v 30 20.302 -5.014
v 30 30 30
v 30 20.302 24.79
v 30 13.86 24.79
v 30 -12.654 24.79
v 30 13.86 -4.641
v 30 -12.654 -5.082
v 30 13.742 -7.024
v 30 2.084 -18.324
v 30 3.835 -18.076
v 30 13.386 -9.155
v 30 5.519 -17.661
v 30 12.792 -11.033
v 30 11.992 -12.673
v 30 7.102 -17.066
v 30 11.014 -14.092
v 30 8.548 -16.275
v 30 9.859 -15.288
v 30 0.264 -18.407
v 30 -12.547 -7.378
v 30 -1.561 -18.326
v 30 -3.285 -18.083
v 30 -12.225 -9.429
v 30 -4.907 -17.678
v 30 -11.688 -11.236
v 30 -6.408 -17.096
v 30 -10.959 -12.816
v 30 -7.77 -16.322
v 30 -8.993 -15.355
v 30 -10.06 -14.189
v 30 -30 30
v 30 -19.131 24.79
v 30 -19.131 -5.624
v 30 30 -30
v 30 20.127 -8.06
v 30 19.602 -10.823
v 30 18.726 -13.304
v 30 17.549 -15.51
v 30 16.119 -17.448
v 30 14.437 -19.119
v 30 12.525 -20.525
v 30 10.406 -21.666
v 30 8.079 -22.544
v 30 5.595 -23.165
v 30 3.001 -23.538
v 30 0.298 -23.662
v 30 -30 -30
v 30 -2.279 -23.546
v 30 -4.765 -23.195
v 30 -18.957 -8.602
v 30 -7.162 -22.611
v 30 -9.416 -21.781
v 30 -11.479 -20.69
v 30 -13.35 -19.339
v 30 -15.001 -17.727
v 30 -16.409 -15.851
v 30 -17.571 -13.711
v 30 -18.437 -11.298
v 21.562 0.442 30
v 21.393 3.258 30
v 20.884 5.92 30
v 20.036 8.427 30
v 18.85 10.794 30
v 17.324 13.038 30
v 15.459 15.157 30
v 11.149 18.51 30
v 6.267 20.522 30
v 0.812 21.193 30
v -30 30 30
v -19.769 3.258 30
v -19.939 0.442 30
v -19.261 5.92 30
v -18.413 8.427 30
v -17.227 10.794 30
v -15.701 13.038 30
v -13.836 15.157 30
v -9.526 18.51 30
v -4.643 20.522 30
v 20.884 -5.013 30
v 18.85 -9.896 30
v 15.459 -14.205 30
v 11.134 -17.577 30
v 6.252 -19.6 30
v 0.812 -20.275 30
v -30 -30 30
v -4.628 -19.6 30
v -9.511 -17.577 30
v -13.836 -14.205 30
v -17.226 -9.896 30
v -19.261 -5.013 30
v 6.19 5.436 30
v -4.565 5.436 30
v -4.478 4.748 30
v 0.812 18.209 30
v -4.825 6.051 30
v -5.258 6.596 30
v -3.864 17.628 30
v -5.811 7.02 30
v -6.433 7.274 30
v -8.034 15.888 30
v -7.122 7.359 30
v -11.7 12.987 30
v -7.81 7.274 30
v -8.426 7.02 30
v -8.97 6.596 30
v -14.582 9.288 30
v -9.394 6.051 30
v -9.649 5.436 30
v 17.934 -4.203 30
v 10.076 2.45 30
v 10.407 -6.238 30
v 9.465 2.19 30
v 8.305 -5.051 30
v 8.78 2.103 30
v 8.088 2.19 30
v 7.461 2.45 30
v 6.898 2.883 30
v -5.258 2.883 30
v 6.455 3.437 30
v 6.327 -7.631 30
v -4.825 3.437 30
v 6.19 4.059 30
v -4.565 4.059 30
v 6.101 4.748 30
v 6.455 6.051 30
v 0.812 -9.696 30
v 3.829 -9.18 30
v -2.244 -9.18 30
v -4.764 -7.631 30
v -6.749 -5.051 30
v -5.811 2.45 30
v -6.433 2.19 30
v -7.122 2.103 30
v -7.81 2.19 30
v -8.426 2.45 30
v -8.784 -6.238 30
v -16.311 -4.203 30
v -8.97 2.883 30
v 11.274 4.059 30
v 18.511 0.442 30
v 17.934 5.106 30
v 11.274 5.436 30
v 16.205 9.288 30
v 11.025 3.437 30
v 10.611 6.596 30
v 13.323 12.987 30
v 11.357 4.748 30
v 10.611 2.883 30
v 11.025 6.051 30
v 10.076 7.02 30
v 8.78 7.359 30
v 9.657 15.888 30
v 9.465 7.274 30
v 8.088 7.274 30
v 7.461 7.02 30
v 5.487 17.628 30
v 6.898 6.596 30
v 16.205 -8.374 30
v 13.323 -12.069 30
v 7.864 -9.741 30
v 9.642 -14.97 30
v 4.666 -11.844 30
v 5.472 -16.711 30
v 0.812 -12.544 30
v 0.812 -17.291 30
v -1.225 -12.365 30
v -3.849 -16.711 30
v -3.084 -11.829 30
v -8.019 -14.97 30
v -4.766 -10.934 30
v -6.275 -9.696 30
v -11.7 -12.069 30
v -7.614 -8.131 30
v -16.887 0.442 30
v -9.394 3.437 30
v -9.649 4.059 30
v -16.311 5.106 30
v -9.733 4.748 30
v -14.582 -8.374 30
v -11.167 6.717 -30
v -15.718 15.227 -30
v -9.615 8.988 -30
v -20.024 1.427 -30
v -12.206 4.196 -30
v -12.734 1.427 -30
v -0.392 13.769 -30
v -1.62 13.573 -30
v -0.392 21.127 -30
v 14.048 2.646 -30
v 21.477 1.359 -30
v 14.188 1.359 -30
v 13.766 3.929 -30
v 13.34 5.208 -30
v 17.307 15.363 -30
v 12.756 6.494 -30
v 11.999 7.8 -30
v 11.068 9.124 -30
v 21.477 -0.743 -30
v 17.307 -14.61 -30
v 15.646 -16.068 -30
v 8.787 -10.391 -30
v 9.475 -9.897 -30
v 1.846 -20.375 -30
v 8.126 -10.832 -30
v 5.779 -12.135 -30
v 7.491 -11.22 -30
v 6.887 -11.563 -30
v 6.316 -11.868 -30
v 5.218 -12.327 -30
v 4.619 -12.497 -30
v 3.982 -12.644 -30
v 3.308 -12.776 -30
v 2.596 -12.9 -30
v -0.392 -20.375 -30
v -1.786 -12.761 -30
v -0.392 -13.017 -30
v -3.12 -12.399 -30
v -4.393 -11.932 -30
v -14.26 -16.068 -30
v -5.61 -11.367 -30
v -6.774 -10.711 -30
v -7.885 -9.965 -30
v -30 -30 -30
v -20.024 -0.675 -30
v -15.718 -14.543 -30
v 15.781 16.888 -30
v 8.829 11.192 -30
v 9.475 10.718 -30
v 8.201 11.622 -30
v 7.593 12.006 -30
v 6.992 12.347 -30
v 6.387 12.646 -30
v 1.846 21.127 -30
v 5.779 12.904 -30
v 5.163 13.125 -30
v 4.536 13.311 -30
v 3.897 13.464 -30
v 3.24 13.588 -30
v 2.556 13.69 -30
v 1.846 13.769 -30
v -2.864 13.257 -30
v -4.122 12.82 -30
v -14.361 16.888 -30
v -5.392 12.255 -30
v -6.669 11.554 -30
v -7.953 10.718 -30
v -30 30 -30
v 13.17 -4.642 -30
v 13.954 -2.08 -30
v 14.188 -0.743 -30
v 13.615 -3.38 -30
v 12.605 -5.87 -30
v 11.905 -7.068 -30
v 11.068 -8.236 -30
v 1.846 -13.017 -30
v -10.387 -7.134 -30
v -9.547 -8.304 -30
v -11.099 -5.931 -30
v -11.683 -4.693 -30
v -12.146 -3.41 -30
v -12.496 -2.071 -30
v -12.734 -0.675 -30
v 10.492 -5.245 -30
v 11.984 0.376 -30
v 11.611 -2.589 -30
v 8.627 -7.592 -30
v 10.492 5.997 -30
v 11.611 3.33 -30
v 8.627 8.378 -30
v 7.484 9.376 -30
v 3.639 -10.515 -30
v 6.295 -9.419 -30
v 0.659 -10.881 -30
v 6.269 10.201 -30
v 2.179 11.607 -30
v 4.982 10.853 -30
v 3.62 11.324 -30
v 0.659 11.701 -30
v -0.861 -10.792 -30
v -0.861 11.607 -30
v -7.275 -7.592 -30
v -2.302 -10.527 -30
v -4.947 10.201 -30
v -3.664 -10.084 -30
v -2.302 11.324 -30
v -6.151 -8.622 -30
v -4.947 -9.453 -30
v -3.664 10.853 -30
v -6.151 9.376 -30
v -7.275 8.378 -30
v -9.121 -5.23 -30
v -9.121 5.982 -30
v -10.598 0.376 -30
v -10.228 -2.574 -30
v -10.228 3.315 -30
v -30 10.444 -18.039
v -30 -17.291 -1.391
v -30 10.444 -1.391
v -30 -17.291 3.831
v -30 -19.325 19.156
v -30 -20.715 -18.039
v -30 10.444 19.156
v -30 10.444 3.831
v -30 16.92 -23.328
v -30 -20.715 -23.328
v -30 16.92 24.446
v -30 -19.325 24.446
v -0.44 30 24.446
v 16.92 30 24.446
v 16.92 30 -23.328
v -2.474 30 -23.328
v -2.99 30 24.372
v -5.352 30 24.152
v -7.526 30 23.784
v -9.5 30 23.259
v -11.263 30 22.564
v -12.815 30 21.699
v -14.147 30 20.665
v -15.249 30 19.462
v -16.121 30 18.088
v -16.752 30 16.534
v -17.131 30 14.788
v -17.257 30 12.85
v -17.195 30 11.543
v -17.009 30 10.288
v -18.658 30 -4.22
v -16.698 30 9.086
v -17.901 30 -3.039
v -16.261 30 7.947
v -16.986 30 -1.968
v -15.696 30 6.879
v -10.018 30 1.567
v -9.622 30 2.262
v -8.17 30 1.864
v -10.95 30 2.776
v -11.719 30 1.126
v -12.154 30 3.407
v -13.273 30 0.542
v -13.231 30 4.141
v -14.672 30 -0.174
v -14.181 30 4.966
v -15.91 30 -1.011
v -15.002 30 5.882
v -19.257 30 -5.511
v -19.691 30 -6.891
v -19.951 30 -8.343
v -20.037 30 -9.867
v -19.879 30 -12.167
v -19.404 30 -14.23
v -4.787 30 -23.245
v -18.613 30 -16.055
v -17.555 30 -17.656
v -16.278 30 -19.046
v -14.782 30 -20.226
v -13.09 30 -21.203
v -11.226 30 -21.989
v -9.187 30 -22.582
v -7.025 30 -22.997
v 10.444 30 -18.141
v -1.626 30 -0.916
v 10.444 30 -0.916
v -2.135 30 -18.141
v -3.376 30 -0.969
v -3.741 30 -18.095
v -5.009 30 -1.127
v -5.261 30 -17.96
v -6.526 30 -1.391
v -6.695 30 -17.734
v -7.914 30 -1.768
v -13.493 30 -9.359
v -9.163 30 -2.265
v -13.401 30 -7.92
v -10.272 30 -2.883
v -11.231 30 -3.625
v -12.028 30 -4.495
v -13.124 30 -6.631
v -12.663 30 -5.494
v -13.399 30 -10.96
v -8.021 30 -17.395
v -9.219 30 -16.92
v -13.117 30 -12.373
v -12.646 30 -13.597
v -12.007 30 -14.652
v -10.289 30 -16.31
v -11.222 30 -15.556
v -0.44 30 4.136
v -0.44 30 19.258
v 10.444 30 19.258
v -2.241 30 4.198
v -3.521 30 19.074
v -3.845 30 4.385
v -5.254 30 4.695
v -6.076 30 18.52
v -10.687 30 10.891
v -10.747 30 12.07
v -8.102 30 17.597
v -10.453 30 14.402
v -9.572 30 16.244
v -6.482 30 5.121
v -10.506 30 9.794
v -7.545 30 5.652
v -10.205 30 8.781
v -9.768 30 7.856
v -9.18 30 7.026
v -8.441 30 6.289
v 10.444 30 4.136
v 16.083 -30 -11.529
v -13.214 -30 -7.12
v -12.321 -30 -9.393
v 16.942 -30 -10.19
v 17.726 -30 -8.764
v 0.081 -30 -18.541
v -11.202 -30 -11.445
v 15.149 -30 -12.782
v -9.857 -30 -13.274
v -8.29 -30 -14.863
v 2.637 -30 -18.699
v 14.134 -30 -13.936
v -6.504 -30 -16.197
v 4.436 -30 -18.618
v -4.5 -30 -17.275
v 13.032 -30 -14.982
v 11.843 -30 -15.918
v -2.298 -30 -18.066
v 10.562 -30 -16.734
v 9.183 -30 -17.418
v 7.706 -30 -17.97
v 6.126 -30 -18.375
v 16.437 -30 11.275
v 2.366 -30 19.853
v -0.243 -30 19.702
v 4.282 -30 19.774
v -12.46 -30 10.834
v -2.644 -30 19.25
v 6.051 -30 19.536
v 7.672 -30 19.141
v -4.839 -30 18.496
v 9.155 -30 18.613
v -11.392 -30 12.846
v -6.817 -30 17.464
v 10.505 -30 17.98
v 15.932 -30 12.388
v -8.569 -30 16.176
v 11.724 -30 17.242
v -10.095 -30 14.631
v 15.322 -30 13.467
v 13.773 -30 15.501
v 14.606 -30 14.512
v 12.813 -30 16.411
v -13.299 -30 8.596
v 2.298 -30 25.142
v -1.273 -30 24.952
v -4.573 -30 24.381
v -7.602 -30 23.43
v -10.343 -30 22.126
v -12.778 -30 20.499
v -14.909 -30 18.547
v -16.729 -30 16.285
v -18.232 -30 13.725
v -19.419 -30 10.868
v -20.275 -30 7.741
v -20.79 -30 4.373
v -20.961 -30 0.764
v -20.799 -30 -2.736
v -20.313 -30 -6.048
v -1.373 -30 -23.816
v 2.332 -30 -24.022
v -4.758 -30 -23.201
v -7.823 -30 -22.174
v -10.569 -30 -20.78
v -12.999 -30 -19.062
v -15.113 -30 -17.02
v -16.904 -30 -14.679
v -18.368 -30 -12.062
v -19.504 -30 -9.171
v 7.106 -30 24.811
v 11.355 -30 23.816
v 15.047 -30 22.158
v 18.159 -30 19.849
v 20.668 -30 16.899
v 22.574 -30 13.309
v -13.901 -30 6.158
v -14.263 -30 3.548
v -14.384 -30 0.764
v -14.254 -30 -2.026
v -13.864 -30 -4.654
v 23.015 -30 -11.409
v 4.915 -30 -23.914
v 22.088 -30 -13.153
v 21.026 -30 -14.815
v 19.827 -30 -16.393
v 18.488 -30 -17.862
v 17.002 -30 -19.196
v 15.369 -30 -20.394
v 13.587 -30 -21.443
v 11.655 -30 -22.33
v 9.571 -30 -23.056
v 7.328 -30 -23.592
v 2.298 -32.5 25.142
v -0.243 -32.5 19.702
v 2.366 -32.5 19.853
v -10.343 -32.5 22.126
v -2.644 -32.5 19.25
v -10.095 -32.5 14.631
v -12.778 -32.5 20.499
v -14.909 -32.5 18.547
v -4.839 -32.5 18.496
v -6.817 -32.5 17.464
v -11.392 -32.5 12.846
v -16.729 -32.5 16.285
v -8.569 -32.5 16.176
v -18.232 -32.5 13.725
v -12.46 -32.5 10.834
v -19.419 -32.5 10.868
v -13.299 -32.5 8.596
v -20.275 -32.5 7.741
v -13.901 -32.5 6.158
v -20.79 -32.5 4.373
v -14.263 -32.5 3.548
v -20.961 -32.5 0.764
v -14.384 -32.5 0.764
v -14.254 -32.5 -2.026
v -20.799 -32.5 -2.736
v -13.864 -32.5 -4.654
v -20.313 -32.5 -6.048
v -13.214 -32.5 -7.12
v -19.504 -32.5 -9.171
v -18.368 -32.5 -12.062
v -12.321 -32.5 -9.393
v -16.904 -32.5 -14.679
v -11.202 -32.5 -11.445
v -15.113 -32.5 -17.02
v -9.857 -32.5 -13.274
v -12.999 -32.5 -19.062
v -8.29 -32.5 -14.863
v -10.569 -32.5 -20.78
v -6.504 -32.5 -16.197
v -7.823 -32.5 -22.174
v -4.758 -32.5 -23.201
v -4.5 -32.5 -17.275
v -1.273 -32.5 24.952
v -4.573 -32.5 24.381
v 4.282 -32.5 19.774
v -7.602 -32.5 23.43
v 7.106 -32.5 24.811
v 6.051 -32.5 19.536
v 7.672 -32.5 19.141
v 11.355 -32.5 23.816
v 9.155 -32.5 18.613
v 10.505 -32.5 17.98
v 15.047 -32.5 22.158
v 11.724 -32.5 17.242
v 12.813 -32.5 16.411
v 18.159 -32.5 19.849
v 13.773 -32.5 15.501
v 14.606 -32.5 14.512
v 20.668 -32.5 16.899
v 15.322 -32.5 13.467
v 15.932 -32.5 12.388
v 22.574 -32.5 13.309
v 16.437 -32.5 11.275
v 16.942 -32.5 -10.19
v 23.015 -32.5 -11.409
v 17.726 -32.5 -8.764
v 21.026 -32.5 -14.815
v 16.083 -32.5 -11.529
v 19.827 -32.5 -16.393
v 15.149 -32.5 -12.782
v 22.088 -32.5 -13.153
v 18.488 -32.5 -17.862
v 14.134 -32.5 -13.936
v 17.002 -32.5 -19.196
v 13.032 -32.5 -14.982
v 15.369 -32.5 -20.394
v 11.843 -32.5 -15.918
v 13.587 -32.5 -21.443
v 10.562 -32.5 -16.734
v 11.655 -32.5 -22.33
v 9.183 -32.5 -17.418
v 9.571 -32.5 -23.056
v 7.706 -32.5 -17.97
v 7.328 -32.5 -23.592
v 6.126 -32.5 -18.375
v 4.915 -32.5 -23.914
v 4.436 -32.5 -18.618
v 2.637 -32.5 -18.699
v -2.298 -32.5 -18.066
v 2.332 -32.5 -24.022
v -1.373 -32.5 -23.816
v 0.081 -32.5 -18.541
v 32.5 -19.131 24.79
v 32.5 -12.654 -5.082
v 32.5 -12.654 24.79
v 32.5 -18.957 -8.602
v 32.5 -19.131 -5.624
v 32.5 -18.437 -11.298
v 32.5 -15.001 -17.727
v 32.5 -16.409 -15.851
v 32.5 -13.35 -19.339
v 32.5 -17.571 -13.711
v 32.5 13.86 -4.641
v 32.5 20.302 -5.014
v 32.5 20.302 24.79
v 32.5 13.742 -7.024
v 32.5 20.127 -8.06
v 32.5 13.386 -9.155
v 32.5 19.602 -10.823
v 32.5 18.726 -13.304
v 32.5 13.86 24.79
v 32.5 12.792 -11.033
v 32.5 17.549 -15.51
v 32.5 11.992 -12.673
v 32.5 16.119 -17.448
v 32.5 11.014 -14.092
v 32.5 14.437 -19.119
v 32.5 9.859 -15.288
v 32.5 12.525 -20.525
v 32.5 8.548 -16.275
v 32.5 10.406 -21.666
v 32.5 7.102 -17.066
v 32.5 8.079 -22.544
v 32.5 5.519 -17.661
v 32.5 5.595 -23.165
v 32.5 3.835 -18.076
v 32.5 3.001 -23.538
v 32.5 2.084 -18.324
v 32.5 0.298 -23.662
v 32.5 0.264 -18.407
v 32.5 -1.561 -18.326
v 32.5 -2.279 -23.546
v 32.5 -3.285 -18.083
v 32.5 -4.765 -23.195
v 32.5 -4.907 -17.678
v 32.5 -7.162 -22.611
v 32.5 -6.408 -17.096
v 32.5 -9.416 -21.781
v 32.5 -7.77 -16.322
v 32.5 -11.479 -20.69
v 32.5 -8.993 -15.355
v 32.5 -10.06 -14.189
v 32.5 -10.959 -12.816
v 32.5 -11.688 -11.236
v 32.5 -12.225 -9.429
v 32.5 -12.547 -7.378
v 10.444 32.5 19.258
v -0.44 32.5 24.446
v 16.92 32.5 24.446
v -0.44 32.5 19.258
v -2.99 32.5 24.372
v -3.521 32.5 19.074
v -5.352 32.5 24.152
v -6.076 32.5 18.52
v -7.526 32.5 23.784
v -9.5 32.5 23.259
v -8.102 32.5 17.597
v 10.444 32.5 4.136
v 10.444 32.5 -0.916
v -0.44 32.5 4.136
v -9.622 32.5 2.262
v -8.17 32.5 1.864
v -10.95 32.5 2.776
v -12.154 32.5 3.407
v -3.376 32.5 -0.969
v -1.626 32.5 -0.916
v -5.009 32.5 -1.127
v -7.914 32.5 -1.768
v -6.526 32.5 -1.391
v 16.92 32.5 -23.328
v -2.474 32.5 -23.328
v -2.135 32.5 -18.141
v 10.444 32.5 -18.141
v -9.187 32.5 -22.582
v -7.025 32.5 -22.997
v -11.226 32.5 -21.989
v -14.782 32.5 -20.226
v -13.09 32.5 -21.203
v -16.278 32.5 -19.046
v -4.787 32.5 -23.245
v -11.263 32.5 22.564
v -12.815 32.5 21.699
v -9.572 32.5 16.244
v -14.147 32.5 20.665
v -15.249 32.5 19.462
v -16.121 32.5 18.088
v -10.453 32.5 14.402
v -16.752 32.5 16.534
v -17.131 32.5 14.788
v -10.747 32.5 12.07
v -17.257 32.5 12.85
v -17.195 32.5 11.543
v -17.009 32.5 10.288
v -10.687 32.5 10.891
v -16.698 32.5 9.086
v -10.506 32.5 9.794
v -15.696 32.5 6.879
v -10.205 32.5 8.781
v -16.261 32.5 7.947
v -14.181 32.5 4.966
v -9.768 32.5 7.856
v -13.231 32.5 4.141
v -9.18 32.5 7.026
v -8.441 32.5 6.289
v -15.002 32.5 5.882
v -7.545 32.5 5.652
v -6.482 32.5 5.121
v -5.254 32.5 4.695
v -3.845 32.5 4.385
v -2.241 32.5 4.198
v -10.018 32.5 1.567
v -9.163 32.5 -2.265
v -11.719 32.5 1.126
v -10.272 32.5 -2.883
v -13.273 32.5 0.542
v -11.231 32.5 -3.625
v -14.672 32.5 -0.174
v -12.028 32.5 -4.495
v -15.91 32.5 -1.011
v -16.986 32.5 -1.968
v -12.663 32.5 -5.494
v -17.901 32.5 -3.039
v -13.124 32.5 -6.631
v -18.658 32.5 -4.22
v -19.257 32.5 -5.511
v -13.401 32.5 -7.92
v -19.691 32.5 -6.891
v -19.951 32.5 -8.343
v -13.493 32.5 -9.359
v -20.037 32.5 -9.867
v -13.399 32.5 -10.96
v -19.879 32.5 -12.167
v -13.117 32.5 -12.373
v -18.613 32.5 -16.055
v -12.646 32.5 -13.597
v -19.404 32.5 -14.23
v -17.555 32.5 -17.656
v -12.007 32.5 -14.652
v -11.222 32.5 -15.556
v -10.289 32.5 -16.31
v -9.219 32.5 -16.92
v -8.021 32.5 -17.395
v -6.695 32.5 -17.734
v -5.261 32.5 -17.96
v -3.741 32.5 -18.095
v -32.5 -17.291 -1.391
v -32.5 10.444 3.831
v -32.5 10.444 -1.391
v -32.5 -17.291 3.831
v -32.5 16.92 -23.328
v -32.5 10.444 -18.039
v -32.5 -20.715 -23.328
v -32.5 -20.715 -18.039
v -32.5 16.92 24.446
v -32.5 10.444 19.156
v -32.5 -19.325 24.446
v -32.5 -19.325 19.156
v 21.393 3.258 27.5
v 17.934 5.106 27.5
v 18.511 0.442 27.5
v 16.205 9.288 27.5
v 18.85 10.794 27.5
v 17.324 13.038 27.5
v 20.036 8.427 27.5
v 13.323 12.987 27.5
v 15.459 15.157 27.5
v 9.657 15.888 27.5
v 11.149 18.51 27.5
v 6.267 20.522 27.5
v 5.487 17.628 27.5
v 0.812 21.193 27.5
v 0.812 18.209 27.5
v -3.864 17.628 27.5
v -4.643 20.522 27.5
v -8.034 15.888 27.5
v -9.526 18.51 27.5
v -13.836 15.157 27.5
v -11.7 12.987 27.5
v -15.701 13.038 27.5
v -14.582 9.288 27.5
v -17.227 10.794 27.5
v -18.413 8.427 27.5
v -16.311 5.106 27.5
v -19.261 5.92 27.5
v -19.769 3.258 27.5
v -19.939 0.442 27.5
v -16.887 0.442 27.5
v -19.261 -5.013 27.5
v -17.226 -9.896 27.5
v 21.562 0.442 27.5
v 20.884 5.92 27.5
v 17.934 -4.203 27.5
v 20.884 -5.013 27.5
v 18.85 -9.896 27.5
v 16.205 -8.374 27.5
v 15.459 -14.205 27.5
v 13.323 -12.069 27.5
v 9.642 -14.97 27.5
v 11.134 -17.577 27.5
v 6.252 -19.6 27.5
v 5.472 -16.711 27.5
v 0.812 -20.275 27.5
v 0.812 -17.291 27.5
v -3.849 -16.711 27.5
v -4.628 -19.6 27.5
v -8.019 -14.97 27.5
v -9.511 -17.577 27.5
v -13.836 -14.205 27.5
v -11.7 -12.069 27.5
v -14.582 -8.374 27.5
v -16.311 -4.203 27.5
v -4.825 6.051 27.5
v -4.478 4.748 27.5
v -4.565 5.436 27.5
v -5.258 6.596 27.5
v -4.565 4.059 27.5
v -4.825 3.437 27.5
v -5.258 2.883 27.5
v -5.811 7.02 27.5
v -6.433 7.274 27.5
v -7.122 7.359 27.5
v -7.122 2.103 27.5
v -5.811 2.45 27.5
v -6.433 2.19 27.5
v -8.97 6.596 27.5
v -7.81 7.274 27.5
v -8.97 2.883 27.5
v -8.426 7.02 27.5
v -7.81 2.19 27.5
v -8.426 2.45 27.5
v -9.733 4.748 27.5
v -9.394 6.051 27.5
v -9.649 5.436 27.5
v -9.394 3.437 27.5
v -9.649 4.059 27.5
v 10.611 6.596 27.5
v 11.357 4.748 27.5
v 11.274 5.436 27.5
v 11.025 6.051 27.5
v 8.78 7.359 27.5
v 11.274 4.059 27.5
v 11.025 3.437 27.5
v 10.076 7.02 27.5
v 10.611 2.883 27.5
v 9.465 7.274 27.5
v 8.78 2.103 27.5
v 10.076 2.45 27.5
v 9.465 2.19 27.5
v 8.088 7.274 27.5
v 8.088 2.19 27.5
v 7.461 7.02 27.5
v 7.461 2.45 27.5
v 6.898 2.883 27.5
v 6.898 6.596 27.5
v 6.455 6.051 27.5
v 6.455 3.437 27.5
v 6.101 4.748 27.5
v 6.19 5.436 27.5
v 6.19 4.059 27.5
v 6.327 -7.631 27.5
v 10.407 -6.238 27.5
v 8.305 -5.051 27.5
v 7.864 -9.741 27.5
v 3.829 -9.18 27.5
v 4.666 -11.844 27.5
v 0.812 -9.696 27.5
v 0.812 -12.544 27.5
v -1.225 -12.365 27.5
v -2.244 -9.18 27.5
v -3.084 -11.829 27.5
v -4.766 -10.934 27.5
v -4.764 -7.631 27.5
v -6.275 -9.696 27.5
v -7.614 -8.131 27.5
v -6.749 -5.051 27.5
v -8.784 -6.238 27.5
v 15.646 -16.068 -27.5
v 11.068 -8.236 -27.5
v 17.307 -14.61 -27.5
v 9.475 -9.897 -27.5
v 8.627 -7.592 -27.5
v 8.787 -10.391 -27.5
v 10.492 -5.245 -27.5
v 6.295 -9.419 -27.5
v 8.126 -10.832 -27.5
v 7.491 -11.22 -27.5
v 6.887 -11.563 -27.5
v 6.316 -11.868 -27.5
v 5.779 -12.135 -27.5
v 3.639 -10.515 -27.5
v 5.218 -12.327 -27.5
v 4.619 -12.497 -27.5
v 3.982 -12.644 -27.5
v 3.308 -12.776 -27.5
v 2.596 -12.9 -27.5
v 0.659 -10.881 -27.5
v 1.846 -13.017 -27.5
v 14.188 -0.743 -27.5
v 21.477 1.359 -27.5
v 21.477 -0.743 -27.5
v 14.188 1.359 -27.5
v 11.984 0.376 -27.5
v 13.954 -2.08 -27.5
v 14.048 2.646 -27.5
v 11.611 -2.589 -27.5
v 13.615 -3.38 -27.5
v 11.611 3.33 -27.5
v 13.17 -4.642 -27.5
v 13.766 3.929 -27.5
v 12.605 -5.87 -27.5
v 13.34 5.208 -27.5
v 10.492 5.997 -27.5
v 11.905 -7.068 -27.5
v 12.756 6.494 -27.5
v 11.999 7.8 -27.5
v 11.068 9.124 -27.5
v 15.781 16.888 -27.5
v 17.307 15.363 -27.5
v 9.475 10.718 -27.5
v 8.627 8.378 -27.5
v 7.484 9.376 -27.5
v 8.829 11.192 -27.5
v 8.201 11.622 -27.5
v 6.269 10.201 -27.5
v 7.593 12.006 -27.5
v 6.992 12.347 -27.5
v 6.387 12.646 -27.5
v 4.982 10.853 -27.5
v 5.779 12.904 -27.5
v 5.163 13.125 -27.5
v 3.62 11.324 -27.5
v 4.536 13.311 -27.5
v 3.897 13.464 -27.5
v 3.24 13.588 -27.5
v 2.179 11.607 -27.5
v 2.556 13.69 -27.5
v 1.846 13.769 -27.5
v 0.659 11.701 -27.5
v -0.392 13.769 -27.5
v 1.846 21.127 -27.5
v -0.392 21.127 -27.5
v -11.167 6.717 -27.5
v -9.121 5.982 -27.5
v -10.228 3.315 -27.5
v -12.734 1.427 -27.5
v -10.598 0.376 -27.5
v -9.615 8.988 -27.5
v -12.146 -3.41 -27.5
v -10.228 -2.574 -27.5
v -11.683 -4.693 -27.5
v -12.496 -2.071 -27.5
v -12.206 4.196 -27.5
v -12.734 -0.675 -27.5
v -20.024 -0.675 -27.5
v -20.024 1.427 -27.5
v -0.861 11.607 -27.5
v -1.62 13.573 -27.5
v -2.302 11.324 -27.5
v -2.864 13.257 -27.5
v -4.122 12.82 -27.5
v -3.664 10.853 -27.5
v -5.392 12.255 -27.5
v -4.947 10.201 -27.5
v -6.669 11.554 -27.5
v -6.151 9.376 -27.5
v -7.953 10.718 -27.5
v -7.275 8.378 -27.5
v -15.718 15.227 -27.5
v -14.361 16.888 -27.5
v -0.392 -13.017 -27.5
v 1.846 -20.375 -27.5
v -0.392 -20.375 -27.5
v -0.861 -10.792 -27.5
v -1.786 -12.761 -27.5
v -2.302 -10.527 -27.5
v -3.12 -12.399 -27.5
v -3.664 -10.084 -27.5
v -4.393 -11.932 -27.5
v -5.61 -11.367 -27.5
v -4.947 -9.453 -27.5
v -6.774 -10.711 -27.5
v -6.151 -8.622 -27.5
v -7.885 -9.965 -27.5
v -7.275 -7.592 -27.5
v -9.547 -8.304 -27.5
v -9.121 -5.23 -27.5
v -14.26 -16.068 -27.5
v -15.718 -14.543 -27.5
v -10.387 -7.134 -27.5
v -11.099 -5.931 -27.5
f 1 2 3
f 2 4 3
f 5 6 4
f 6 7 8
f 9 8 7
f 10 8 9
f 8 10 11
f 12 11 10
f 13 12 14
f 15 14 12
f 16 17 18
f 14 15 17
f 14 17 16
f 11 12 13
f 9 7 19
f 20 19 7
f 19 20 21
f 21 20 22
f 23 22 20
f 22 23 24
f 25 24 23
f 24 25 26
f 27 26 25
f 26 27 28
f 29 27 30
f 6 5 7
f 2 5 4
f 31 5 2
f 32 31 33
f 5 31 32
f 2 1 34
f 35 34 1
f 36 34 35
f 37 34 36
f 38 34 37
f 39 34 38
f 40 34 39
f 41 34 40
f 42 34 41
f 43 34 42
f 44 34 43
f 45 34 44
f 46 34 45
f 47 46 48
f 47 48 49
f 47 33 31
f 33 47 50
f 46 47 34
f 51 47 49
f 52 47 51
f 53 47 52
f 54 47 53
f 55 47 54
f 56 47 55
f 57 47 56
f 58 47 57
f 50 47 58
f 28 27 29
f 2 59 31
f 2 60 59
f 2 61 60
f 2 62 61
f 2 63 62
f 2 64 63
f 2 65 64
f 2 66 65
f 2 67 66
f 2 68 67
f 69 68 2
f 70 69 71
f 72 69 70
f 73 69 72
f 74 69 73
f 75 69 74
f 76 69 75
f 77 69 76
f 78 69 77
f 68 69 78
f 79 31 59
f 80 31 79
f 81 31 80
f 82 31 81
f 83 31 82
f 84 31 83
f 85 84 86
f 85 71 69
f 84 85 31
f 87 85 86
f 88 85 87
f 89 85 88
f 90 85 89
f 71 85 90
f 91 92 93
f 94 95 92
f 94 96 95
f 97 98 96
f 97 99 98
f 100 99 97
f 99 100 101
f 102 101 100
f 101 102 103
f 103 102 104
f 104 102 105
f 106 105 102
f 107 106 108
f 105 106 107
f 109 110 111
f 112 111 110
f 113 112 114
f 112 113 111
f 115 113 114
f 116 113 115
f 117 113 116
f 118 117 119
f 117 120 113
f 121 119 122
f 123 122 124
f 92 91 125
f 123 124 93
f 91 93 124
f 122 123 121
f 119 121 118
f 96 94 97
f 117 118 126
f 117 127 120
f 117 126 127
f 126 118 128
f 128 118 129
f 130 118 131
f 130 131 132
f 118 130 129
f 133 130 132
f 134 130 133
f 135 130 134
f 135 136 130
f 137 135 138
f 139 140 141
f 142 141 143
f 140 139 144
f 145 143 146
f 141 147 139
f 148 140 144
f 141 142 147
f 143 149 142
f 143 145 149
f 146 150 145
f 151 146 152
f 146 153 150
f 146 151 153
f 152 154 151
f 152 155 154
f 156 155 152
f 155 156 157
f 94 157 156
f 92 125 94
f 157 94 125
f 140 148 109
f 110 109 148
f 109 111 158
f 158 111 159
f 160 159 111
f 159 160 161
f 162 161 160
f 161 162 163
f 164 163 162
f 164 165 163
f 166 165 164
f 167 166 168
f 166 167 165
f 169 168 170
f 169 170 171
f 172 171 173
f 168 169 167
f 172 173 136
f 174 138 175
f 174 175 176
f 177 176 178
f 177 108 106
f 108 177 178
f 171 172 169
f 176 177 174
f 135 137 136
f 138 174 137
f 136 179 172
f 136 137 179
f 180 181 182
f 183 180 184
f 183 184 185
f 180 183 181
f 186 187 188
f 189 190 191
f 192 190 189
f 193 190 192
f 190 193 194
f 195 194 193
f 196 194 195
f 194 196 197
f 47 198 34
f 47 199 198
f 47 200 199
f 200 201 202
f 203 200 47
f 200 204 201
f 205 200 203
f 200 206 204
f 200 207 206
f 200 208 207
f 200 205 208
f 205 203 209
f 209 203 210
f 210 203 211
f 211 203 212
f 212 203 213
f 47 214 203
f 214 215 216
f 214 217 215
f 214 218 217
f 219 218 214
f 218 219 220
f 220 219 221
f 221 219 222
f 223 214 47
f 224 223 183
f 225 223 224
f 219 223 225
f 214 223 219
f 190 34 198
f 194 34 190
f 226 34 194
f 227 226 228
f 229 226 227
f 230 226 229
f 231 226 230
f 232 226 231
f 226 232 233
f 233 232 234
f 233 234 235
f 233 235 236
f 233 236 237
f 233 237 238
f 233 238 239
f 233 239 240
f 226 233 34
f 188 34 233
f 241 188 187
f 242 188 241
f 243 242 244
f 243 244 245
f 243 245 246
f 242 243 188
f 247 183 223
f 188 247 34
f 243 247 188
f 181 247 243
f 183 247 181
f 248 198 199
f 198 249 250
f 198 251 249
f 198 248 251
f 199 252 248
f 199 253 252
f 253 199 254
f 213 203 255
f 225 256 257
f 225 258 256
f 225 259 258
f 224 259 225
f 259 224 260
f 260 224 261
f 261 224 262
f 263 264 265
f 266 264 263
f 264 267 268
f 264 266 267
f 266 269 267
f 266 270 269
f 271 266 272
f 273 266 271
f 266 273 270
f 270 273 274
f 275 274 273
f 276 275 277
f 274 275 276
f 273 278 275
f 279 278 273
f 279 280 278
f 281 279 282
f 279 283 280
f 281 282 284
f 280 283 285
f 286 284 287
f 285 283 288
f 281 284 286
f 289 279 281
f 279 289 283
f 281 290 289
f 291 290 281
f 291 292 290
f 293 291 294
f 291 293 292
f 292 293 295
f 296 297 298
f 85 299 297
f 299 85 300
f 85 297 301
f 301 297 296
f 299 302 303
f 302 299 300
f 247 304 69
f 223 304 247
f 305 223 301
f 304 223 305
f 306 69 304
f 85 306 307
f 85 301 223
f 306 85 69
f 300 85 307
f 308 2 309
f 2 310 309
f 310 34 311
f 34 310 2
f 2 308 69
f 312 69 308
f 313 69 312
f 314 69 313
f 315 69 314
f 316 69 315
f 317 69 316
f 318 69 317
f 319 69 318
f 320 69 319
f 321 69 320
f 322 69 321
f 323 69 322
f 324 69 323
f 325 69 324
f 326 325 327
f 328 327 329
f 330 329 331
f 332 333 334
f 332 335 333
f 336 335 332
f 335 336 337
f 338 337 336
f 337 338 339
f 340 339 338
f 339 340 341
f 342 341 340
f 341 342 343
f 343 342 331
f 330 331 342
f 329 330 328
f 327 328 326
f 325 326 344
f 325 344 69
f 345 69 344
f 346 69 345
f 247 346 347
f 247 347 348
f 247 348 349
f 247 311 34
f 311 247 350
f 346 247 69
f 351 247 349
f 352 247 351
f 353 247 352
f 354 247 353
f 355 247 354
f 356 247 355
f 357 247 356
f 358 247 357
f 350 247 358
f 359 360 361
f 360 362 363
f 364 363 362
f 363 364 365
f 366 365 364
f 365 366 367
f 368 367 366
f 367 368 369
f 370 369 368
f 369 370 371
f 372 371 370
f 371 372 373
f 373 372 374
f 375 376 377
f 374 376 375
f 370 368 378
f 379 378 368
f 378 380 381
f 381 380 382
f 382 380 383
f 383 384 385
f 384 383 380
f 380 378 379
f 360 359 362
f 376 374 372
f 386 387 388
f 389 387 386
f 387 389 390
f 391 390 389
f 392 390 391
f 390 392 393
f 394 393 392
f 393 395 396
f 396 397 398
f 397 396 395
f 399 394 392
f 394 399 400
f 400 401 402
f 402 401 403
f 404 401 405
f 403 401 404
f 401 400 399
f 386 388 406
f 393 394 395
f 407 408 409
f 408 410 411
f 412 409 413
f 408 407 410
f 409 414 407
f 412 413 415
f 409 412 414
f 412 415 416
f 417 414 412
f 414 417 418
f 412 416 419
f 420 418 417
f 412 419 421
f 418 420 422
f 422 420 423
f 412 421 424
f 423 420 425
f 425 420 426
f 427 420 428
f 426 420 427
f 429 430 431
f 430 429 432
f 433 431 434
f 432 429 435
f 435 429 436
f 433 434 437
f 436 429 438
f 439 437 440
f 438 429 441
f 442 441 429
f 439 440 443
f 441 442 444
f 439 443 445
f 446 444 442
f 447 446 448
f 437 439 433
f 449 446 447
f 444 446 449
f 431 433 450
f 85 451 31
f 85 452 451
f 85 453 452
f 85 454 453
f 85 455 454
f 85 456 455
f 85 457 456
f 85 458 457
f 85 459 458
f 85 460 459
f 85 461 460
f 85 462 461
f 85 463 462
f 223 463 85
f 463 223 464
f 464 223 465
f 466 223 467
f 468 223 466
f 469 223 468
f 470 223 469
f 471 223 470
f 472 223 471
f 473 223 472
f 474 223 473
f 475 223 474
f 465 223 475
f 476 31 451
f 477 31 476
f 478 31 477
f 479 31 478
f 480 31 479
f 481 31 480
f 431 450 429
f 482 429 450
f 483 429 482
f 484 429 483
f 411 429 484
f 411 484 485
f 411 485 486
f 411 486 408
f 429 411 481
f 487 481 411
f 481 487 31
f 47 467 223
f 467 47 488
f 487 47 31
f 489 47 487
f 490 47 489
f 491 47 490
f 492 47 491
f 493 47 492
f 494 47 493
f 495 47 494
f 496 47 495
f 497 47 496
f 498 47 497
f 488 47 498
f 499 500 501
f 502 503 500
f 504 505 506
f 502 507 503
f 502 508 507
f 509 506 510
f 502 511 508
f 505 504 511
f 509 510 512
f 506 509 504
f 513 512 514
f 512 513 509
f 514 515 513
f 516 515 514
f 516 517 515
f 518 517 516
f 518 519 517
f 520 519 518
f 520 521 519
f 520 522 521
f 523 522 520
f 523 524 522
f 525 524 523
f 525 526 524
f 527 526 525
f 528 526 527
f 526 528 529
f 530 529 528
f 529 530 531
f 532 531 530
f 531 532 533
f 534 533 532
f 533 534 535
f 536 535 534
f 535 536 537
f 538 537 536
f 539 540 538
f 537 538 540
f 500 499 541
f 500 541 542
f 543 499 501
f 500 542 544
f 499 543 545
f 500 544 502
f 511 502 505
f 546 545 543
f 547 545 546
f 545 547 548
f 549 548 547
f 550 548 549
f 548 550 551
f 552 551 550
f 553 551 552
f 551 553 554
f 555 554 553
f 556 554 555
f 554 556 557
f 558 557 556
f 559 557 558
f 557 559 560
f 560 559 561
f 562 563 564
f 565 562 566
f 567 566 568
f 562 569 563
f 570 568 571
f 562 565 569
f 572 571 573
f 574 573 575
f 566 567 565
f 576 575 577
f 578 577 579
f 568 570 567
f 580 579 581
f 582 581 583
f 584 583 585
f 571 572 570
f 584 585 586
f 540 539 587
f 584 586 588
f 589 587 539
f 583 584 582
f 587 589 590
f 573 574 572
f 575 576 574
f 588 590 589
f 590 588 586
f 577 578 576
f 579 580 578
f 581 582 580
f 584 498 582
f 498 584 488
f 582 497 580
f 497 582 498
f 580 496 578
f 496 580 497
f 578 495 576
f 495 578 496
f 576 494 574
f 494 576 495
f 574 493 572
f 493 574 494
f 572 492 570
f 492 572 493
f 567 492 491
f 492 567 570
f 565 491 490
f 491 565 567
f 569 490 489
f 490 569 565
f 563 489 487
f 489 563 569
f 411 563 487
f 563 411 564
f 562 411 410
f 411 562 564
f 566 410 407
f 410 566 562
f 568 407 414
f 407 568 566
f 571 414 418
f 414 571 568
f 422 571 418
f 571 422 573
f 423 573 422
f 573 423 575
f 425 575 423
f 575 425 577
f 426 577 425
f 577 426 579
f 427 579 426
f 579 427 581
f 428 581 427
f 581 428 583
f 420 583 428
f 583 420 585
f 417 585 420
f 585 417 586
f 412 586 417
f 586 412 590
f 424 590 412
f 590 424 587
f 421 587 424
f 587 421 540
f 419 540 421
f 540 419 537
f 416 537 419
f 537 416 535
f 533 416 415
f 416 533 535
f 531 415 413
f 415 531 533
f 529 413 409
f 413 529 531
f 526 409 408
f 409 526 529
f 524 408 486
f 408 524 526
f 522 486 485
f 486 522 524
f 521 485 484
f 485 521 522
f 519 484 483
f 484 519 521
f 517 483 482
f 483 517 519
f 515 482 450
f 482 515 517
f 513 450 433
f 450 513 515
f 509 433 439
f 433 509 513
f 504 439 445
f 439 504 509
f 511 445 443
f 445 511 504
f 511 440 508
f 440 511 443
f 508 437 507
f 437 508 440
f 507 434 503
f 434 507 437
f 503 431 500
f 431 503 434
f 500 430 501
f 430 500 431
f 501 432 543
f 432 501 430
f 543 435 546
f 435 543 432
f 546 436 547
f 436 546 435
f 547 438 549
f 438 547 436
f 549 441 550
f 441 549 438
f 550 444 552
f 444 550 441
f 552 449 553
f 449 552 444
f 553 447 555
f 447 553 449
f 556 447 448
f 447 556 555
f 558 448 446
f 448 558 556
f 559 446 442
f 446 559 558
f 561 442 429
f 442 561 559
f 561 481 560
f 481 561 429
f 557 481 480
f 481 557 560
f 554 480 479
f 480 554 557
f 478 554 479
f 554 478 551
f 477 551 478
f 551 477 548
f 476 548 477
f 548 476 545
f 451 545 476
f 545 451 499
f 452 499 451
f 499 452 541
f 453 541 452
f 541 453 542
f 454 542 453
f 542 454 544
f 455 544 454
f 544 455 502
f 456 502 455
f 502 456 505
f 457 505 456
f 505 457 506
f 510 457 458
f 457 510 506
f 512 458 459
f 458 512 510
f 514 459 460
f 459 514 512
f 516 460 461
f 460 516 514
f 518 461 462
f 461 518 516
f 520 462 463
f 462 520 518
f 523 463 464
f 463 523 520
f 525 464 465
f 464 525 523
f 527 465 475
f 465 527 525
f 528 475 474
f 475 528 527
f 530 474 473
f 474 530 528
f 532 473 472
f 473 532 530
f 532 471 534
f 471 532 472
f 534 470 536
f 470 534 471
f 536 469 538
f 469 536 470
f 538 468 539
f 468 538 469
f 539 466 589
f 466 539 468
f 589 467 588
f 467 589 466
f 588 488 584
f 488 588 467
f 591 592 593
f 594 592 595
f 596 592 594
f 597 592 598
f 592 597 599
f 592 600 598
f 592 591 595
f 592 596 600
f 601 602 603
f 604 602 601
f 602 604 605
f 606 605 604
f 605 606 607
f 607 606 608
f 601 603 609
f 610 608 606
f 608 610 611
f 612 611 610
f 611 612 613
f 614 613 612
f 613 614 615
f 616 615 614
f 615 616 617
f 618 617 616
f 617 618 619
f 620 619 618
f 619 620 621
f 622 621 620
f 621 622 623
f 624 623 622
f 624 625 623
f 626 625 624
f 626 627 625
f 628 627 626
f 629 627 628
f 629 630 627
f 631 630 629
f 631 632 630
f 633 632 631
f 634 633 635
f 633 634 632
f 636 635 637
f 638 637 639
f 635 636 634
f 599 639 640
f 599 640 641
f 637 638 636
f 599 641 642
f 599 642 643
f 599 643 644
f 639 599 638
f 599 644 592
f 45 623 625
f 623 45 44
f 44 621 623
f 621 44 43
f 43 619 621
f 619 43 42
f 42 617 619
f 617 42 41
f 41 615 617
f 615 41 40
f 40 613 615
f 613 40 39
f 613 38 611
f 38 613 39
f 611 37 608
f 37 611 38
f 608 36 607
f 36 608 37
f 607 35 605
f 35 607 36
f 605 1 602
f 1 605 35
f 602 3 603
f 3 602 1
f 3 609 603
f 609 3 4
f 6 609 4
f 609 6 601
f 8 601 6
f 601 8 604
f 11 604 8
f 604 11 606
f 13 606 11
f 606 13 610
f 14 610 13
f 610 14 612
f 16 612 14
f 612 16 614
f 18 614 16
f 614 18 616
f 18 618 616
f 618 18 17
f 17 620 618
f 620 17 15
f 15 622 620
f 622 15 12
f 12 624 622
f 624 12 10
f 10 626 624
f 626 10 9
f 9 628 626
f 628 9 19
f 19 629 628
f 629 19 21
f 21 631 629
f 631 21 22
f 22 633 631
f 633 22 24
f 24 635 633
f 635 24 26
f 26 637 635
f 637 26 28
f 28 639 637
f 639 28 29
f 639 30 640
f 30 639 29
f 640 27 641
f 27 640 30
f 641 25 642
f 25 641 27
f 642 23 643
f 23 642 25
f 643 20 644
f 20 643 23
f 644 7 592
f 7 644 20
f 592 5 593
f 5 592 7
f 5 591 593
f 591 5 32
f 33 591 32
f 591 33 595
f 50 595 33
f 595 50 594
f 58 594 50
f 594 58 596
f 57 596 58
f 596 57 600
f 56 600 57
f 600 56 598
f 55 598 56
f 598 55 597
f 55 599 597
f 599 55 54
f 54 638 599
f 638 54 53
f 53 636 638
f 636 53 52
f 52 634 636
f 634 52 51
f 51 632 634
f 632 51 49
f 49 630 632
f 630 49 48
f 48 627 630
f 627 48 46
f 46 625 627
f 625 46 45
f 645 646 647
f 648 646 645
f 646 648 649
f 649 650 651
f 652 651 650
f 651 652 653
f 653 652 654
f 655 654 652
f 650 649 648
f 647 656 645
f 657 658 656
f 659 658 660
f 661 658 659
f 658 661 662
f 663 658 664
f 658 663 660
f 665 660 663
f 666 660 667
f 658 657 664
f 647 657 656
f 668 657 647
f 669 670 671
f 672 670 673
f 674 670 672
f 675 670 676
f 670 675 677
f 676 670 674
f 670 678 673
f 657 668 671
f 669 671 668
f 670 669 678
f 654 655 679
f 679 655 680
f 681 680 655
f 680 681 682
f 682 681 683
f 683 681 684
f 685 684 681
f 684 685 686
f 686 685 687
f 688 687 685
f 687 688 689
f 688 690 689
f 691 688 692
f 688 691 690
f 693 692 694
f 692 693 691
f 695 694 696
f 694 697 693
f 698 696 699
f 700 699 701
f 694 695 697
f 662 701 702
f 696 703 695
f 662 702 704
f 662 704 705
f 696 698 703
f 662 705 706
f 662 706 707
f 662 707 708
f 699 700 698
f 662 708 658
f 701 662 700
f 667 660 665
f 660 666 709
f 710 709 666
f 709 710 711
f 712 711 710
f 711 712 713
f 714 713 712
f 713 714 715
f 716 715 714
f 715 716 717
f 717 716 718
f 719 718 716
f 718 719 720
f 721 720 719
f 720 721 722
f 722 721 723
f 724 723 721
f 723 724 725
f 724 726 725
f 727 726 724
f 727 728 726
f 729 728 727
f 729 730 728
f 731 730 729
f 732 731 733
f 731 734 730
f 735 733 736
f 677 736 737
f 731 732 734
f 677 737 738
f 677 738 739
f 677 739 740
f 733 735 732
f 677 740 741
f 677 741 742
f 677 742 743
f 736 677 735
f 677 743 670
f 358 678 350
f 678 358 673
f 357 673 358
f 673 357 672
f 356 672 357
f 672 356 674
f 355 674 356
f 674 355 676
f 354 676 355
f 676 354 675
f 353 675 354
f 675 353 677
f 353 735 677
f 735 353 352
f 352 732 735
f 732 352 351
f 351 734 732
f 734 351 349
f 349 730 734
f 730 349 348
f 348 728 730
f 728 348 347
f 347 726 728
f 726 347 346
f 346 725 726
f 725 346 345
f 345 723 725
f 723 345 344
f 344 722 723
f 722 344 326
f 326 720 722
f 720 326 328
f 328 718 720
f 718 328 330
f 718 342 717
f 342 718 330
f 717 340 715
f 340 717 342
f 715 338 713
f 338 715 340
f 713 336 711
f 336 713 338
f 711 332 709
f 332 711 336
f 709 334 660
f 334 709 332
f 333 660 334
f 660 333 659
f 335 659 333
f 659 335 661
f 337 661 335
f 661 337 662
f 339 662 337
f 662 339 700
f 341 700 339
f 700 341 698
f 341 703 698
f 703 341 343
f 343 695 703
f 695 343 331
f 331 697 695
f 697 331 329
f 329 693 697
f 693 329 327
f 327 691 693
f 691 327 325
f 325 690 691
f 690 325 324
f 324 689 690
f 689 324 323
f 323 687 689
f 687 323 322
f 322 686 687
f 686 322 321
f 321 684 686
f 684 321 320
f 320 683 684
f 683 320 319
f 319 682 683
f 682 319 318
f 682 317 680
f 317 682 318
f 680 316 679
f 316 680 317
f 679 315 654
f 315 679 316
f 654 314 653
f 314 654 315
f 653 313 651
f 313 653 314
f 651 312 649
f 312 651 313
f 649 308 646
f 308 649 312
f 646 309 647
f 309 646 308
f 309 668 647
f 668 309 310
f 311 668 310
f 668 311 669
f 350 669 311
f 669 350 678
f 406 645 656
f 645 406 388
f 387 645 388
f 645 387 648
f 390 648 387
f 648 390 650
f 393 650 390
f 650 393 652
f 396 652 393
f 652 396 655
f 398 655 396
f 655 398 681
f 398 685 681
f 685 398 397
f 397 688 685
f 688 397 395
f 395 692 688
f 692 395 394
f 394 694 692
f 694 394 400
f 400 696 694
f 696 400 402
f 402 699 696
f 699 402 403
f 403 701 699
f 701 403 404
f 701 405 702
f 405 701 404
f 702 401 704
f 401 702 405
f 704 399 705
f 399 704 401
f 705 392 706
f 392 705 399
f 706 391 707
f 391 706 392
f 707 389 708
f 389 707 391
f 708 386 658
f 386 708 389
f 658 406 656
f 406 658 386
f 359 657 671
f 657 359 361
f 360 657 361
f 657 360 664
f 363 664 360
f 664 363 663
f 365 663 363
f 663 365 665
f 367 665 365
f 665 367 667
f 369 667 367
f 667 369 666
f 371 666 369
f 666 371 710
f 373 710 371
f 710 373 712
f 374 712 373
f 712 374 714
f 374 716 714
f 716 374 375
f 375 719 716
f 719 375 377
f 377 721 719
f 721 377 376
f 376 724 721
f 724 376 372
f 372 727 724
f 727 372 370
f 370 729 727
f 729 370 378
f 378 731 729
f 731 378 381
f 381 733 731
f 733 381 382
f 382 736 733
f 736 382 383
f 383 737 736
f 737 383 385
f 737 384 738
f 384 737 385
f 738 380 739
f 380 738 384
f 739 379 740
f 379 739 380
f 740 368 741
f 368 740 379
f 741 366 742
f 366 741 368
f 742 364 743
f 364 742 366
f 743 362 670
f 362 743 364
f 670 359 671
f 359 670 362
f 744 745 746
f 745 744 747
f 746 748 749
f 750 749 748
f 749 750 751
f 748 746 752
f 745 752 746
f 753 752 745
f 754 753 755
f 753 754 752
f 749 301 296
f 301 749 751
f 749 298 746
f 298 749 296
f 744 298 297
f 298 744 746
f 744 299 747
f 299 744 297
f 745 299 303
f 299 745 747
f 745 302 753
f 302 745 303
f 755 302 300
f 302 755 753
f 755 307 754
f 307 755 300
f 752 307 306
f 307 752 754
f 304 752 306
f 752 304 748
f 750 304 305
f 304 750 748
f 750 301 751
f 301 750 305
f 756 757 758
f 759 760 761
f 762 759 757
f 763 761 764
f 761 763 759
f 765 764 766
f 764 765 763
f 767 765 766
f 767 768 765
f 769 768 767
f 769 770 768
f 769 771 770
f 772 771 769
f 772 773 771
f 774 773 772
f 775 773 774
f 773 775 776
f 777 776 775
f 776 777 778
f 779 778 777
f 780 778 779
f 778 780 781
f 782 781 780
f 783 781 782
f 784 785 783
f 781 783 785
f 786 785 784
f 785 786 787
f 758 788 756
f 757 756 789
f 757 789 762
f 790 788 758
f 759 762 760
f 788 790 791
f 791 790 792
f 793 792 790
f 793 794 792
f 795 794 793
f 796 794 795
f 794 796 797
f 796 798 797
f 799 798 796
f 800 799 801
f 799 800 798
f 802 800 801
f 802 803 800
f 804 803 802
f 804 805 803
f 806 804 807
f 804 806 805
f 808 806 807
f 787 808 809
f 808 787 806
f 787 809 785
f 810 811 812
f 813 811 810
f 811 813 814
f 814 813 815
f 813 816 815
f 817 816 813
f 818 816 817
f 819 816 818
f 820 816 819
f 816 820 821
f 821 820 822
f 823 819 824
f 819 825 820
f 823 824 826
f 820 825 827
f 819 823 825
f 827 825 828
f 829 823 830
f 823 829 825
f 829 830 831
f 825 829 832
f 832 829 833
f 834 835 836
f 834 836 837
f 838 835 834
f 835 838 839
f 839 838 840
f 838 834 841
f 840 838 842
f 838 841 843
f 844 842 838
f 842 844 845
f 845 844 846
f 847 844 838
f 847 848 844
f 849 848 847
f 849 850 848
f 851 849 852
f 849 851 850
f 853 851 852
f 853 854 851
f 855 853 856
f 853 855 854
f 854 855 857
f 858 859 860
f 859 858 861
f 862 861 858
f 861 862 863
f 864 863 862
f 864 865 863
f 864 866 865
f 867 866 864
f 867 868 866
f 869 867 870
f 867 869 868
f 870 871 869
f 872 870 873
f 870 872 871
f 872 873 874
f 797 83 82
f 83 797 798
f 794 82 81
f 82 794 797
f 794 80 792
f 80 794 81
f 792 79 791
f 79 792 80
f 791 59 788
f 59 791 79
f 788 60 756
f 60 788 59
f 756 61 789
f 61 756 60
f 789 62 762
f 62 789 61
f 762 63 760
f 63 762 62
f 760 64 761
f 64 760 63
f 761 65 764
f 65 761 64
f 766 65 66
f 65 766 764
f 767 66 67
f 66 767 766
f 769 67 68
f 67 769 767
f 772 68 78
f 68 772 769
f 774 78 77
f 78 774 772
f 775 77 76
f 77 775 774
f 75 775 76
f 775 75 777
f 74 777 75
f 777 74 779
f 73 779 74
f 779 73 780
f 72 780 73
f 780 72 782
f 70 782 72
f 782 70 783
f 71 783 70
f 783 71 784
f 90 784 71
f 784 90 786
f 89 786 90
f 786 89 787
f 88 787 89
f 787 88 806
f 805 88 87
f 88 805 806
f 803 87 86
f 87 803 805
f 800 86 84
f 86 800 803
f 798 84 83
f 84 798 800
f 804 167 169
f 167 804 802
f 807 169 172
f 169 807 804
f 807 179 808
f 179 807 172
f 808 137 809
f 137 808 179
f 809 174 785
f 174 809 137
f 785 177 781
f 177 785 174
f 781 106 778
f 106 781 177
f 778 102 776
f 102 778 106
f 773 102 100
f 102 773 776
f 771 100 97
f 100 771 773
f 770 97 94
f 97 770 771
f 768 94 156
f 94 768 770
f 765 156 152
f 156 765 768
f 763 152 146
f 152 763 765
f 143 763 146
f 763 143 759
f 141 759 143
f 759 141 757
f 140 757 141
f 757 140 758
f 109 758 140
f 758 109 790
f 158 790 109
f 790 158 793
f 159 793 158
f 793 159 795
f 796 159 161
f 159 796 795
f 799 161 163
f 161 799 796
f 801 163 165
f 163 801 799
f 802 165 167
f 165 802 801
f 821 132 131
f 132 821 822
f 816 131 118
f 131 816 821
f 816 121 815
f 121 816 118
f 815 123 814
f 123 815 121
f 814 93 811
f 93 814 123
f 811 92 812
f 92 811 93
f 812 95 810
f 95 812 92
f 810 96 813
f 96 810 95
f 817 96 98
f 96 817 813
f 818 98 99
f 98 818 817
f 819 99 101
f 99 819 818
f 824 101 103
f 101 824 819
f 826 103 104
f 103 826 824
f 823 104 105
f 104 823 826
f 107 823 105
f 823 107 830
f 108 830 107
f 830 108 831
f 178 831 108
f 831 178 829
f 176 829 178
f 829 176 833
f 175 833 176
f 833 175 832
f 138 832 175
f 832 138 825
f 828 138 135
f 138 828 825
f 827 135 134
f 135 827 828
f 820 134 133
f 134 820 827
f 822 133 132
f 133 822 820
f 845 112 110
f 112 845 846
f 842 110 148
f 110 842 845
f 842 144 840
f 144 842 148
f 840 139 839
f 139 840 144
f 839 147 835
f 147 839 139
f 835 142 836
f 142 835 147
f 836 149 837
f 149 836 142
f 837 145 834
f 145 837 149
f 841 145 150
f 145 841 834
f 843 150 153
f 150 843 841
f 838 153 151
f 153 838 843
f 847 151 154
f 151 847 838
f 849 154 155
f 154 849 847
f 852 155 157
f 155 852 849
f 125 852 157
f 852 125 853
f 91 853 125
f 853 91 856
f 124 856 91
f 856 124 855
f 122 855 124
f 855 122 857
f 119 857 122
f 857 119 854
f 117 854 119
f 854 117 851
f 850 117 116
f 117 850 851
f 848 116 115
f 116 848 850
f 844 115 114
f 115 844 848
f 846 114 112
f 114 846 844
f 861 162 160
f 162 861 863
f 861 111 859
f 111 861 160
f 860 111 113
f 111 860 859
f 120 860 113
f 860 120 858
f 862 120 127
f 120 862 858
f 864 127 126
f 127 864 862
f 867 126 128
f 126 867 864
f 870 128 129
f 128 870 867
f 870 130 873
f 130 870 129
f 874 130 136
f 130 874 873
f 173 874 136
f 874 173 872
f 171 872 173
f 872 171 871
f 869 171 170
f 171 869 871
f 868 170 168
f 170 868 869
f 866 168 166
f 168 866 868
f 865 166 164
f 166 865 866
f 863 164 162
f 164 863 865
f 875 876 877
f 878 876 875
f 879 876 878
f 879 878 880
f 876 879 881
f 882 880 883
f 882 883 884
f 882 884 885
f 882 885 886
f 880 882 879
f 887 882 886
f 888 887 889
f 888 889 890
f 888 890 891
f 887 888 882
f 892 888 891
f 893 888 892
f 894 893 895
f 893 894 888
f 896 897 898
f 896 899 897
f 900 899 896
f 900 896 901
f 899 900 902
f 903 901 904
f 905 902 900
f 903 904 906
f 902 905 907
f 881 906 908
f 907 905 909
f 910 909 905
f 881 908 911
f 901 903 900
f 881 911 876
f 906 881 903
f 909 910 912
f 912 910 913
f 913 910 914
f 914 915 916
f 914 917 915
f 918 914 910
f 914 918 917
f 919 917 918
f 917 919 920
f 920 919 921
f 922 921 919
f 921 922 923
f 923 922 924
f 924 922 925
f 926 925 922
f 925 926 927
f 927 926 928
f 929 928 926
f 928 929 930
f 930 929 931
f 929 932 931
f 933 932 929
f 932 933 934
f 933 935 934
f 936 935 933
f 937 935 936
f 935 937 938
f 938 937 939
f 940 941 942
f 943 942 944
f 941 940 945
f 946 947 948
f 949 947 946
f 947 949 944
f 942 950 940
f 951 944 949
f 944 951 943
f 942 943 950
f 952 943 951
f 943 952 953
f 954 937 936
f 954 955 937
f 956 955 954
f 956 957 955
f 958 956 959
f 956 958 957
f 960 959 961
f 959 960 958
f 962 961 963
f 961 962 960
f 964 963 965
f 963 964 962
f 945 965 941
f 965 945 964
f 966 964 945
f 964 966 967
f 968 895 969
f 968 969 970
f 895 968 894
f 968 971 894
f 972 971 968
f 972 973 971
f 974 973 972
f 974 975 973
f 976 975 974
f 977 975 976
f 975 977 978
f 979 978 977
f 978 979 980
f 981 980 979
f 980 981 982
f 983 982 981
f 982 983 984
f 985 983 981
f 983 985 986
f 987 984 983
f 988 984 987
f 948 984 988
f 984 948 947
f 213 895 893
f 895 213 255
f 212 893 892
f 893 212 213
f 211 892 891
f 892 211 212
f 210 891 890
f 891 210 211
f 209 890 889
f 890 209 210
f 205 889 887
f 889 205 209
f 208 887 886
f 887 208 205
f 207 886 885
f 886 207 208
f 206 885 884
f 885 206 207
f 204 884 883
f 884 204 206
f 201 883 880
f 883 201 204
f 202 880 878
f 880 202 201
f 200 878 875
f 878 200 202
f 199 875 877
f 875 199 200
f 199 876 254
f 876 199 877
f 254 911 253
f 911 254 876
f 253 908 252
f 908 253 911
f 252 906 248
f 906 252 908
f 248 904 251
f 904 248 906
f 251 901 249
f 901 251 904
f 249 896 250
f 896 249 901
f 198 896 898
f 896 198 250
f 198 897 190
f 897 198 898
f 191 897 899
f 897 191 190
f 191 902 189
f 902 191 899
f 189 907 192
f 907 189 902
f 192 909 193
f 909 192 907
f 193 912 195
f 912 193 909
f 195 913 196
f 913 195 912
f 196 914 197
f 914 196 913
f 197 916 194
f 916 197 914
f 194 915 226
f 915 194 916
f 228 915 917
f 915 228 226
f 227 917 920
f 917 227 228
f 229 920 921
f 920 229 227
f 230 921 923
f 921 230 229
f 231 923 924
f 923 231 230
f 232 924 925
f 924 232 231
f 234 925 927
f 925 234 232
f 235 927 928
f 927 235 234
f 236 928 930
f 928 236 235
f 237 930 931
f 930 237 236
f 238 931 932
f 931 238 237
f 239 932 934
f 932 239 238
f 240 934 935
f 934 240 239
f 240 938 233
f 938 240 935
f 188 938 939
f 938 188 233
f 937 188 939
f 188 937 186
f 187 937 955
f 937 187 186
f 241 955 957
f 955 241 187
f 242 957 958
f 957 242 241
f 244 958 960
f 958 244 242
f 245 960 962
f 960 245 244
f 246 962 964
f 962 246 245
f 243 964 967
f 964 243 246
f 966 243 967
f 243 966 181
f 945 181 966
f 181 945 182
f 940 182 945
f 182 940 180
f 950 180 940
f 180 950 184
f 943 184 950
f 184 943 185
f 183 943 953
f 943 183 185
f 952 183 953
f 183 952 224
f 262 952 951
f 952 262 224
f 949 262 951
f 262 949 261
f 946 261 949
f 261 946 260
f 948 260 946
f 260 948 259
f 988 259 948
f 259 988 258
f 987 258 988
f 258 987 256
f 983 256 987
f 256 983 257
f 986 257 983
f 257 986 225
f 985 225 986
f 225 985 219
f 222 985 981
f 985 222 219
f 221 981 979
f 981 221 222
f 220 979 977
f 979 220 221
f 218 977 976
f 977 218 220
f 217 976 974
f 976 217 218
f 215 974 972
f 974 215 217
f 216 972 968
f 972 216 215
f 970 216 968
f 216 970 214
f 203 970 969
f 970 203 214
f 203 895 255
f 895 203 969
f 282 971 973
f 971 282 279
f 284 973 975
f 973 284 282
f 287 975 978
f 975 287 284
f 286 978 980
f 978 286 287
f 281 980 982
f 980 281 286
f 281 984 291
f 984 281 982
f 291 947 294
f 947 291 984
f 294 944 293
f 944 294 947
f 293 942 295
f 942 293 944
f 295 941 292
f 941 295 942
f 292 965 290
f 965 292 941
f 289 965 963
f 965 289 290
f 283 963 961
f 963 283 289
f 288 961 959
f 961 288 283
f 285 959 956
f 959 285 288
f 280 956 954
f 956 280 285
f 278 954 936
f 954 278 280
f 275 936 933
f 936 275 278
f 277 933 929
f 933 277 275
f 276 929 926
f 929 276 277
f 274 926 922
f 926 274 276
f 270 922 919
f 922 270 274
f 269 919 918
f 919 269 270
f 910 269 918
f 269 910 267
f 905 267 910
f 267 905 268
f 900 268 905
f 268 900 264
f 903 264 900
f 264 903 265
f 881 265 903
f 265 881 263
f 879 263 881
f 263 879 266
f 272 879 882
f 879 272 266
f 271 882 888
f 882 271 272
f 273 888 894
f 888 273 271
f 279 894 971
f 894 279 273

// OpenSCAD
// text_on_cube.scad - Example for text() usage in OpenSCAD

echo(version = version());

font = "Liberation Sans";  //["Liberation Sans", "Liberation Sans:style=Bold", "Liberation Sans:style=Italic", "Liberation Mono", "Liberation Serif"]

cube_size = 60;
letter_size = 50;
letter_height = 5;

o = cube_size / 2 - letter_height / 2;

module letter(l) {
    // Use linear_extrude() to make the letters 3D objects as they
    // are only 2D shapes when only using text()
    linear_extrude(height = letter_height) {
        text(l, size = letter_size, font = font, halign = "center", valign = "center", $fn = 16);
    }
}

difference() {
    union() {
        color("gray") cube(cube_size, center = true);
        translate([0, -o, 0]) rotate([90, 0, 0]) letter("C");
        translate([o, 0, 0]) rotate([90, 0, 90]) letter("U");
        translate([0, o, 0]) rotate([90, 0, 180]) letter("B");
        translate([-o, 0, 0]) rotate([90, 0, -90]) letter("E");
    }

    // Put some symbols on top and bottom using symbols from the
    // Unicode symbols table.
    // (see https://en.wikipedia.org/wiki/Miscellaneous_Symbols)
    //
    // Note that depending on the font used, not all the symbols
    // are actually available.
    translate([0, 0, o]) letter("\u263A");
    translate([0, 0, -o - letter_height]) letter("\u263C");
}

// Written in 2014 by Torsten Paul <Torsten.Paul@gmx.de>
//
// To the extent possible under law, the author(s) have dedicated all
// copyright and related and neighboring rights to this software to the
// public domain worldwide. This software is distributed without any
// warranty.
//
// You should have received a copy of the CC0 Public Domain
// Dedication along with this software.
// If not, see <http://creativecommons.org/publicdomain/zero/1.0/>.
